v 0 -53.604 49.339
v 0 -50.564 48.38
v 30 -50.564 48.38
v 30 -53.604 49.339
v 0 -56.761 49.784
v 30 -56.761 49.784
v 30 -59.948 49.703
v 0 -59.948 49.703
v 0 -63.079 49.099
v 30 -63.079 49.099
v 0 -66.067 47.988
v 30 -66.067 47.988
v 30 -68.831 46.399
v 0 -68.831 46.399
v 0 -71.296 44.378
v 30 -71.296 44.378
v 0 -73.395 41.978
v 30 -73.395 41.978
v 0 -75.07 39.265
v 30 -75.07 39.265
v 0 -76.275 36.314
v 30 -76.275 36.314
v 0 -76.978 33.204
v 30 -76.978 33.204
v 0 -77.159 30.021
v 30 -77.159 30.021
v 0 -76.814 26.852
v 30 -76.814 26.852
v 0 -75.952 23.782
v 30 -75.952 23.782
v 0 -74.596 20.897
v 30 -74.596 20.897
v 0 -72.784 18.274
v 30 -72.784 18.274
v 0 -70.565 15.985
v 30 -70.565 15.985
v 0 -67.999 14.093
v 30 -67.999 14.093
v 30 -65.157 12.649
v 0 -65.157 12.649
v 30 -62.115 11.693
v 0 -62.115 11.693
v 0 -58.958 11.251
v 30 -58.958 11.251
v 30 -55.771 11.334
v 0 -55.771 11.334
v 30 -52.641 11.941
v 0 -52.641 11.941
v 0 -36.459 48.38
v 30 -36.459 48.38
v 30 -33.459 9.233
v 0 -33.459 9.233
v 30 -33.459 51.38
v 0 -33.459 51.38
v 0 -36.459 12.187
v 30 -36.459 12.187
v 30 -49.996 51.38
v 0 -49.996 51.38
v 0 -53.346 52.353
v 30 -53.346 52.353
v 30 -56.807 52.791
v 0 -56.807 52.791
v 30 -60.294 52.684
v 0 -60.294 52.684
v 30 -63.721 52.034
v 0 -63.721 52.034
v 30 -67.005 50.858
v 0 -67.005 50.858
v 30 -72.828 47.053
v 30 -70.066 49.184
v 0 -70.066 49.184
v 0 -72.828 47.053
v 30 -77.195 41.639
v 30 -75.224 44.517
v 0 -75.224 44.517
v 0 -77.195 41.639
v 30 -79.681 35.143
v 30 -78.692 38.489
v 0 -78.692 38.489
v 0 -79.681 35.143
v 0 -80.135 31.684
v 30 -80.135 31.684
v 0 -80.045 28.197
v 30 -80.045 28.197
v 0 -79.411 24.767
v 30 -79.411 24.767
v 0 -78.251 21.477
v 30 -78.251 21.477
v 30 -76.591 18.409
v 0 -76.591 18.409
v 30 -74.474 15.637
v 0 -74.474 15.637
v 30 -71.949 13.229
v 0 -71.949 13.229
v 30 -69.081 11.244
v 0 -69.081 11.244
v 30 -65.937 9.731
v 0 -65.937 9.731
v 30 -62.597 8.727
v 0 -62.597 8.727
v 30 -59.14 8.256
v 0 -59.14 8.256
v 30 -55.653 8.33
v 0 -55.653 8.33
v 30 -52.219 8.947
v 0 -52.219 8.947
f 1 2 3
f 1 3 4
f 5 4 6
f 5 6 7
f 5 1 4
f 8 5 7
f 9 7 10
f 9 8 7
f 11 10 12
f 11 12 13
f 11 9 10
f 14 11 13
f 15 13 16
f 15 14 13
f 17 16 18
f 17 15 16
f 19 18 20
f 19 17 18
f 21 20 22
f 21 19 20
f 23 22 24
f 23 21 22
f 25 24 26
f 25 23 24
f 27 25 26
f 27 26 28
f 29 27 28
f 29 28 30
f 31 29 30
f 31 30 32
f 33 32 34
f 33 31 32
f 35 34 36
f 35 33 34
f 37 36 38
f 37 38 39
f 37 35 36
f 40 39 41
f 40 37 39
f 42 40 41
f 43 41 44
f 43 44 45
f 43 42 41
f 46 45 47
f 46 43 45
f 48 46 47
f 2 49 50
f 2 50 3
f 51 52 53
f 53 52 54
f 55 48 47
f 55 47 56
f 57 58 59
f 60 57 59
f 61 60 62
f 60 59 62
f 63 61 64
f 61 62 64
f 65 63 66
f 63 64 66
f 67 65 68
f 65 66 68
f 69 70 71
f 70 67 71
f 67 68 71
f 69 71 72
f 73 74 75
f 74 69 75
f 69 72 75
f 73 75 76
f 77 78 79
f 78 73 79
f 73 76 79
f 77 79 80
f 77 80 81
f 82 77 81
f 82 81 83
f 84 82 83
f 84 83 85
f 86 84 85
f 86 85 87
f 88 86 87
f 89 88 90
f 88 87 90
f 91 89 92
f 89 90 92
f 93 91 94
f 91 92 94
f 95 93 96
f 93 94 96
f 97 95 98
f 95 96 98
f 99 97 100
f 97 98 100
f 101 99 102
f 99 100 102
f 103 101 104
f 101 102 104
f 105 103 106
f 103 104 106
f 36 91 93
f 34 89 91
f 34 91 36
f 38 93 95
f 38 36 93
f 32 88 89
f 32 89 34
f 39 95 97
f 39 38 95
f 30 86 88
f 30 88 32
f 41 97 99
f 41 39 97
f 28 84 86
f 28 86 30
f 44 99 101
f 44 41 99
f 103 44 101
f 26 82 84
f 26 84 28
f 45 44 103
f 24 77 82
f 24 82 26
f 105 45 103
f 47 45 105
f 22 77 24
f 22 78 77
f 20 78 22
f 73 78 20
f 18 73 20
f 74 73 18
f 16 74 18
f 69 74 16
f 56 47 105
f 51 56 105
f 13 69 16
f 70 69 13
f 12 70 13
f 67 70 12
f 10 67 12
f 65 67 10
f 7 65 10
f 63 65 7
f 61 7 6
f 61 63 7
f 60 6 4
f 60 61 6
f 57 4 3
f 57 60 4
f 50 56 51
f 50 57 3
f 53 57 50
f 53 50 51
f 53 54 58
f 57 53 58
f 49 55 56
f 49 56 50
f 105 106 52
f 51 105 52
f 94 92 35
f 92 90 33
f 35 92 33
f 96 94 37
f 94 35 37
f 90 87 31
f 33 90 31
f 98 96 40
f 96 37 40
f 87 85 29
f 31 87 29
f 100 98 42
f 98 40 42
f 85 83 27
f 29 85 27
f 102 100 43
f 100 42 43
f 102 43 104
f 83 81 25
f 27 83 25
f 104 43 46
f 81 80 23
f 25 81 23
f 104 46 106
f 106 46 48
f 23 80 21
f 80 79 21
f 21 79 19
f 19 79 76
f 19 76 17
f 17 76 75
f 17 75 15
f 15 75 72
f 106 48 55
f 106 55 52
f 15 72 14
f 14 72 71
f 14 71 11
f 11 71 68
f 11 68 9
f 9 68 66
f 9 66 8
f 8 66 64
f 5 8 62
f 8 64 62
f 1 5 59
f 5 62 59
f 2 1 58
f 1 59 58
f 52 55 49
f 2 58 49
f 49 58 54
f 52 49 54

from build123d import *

# Parameters (mm, degrees)
F1_DEPTH = 30
F2_T     = 3


with BuildPart() as f1:
    # F0 (on Right) → F1 (new body)
    with BuildSketch(Plane.YZ):
        with BuildLine():
            ThreePointArc((-50.5638438315, 48.3802992553), (-77.1344876234, 31.6163385121), (-52.6412177761, 11.9412470637))
            Line((-52.6412177761, 11.9412470637), (-36.4591793272, 12.1873354573))
            Line((-36.4591793272, 12.1873354573), (-36.4591793272, 42.854900606))
            Line((-36.4591793272, 42.854900606), (-36.4591793272, 48.3802992553))
            Line((-36.4591793272, 48.3802992553), (-38.9720265736, 48.3802992553))
            Line((-38.9720265736, 48.3802992553), (-50.5638438315, 48.3802992553))
        make_face()
    extrude(amount=F1_DEPTH)

    # F2
    f2_openings = [f1.faces().sort_by_distance(p)[0] for p in [
        (30, -55.280278, 30.40174),
        (0, -55.280278, 30.40174),
    ]]
    offset(amount=F2_T, openings=f2_openings, kind=Kind.INTERSECTION)


solid = f1.part
